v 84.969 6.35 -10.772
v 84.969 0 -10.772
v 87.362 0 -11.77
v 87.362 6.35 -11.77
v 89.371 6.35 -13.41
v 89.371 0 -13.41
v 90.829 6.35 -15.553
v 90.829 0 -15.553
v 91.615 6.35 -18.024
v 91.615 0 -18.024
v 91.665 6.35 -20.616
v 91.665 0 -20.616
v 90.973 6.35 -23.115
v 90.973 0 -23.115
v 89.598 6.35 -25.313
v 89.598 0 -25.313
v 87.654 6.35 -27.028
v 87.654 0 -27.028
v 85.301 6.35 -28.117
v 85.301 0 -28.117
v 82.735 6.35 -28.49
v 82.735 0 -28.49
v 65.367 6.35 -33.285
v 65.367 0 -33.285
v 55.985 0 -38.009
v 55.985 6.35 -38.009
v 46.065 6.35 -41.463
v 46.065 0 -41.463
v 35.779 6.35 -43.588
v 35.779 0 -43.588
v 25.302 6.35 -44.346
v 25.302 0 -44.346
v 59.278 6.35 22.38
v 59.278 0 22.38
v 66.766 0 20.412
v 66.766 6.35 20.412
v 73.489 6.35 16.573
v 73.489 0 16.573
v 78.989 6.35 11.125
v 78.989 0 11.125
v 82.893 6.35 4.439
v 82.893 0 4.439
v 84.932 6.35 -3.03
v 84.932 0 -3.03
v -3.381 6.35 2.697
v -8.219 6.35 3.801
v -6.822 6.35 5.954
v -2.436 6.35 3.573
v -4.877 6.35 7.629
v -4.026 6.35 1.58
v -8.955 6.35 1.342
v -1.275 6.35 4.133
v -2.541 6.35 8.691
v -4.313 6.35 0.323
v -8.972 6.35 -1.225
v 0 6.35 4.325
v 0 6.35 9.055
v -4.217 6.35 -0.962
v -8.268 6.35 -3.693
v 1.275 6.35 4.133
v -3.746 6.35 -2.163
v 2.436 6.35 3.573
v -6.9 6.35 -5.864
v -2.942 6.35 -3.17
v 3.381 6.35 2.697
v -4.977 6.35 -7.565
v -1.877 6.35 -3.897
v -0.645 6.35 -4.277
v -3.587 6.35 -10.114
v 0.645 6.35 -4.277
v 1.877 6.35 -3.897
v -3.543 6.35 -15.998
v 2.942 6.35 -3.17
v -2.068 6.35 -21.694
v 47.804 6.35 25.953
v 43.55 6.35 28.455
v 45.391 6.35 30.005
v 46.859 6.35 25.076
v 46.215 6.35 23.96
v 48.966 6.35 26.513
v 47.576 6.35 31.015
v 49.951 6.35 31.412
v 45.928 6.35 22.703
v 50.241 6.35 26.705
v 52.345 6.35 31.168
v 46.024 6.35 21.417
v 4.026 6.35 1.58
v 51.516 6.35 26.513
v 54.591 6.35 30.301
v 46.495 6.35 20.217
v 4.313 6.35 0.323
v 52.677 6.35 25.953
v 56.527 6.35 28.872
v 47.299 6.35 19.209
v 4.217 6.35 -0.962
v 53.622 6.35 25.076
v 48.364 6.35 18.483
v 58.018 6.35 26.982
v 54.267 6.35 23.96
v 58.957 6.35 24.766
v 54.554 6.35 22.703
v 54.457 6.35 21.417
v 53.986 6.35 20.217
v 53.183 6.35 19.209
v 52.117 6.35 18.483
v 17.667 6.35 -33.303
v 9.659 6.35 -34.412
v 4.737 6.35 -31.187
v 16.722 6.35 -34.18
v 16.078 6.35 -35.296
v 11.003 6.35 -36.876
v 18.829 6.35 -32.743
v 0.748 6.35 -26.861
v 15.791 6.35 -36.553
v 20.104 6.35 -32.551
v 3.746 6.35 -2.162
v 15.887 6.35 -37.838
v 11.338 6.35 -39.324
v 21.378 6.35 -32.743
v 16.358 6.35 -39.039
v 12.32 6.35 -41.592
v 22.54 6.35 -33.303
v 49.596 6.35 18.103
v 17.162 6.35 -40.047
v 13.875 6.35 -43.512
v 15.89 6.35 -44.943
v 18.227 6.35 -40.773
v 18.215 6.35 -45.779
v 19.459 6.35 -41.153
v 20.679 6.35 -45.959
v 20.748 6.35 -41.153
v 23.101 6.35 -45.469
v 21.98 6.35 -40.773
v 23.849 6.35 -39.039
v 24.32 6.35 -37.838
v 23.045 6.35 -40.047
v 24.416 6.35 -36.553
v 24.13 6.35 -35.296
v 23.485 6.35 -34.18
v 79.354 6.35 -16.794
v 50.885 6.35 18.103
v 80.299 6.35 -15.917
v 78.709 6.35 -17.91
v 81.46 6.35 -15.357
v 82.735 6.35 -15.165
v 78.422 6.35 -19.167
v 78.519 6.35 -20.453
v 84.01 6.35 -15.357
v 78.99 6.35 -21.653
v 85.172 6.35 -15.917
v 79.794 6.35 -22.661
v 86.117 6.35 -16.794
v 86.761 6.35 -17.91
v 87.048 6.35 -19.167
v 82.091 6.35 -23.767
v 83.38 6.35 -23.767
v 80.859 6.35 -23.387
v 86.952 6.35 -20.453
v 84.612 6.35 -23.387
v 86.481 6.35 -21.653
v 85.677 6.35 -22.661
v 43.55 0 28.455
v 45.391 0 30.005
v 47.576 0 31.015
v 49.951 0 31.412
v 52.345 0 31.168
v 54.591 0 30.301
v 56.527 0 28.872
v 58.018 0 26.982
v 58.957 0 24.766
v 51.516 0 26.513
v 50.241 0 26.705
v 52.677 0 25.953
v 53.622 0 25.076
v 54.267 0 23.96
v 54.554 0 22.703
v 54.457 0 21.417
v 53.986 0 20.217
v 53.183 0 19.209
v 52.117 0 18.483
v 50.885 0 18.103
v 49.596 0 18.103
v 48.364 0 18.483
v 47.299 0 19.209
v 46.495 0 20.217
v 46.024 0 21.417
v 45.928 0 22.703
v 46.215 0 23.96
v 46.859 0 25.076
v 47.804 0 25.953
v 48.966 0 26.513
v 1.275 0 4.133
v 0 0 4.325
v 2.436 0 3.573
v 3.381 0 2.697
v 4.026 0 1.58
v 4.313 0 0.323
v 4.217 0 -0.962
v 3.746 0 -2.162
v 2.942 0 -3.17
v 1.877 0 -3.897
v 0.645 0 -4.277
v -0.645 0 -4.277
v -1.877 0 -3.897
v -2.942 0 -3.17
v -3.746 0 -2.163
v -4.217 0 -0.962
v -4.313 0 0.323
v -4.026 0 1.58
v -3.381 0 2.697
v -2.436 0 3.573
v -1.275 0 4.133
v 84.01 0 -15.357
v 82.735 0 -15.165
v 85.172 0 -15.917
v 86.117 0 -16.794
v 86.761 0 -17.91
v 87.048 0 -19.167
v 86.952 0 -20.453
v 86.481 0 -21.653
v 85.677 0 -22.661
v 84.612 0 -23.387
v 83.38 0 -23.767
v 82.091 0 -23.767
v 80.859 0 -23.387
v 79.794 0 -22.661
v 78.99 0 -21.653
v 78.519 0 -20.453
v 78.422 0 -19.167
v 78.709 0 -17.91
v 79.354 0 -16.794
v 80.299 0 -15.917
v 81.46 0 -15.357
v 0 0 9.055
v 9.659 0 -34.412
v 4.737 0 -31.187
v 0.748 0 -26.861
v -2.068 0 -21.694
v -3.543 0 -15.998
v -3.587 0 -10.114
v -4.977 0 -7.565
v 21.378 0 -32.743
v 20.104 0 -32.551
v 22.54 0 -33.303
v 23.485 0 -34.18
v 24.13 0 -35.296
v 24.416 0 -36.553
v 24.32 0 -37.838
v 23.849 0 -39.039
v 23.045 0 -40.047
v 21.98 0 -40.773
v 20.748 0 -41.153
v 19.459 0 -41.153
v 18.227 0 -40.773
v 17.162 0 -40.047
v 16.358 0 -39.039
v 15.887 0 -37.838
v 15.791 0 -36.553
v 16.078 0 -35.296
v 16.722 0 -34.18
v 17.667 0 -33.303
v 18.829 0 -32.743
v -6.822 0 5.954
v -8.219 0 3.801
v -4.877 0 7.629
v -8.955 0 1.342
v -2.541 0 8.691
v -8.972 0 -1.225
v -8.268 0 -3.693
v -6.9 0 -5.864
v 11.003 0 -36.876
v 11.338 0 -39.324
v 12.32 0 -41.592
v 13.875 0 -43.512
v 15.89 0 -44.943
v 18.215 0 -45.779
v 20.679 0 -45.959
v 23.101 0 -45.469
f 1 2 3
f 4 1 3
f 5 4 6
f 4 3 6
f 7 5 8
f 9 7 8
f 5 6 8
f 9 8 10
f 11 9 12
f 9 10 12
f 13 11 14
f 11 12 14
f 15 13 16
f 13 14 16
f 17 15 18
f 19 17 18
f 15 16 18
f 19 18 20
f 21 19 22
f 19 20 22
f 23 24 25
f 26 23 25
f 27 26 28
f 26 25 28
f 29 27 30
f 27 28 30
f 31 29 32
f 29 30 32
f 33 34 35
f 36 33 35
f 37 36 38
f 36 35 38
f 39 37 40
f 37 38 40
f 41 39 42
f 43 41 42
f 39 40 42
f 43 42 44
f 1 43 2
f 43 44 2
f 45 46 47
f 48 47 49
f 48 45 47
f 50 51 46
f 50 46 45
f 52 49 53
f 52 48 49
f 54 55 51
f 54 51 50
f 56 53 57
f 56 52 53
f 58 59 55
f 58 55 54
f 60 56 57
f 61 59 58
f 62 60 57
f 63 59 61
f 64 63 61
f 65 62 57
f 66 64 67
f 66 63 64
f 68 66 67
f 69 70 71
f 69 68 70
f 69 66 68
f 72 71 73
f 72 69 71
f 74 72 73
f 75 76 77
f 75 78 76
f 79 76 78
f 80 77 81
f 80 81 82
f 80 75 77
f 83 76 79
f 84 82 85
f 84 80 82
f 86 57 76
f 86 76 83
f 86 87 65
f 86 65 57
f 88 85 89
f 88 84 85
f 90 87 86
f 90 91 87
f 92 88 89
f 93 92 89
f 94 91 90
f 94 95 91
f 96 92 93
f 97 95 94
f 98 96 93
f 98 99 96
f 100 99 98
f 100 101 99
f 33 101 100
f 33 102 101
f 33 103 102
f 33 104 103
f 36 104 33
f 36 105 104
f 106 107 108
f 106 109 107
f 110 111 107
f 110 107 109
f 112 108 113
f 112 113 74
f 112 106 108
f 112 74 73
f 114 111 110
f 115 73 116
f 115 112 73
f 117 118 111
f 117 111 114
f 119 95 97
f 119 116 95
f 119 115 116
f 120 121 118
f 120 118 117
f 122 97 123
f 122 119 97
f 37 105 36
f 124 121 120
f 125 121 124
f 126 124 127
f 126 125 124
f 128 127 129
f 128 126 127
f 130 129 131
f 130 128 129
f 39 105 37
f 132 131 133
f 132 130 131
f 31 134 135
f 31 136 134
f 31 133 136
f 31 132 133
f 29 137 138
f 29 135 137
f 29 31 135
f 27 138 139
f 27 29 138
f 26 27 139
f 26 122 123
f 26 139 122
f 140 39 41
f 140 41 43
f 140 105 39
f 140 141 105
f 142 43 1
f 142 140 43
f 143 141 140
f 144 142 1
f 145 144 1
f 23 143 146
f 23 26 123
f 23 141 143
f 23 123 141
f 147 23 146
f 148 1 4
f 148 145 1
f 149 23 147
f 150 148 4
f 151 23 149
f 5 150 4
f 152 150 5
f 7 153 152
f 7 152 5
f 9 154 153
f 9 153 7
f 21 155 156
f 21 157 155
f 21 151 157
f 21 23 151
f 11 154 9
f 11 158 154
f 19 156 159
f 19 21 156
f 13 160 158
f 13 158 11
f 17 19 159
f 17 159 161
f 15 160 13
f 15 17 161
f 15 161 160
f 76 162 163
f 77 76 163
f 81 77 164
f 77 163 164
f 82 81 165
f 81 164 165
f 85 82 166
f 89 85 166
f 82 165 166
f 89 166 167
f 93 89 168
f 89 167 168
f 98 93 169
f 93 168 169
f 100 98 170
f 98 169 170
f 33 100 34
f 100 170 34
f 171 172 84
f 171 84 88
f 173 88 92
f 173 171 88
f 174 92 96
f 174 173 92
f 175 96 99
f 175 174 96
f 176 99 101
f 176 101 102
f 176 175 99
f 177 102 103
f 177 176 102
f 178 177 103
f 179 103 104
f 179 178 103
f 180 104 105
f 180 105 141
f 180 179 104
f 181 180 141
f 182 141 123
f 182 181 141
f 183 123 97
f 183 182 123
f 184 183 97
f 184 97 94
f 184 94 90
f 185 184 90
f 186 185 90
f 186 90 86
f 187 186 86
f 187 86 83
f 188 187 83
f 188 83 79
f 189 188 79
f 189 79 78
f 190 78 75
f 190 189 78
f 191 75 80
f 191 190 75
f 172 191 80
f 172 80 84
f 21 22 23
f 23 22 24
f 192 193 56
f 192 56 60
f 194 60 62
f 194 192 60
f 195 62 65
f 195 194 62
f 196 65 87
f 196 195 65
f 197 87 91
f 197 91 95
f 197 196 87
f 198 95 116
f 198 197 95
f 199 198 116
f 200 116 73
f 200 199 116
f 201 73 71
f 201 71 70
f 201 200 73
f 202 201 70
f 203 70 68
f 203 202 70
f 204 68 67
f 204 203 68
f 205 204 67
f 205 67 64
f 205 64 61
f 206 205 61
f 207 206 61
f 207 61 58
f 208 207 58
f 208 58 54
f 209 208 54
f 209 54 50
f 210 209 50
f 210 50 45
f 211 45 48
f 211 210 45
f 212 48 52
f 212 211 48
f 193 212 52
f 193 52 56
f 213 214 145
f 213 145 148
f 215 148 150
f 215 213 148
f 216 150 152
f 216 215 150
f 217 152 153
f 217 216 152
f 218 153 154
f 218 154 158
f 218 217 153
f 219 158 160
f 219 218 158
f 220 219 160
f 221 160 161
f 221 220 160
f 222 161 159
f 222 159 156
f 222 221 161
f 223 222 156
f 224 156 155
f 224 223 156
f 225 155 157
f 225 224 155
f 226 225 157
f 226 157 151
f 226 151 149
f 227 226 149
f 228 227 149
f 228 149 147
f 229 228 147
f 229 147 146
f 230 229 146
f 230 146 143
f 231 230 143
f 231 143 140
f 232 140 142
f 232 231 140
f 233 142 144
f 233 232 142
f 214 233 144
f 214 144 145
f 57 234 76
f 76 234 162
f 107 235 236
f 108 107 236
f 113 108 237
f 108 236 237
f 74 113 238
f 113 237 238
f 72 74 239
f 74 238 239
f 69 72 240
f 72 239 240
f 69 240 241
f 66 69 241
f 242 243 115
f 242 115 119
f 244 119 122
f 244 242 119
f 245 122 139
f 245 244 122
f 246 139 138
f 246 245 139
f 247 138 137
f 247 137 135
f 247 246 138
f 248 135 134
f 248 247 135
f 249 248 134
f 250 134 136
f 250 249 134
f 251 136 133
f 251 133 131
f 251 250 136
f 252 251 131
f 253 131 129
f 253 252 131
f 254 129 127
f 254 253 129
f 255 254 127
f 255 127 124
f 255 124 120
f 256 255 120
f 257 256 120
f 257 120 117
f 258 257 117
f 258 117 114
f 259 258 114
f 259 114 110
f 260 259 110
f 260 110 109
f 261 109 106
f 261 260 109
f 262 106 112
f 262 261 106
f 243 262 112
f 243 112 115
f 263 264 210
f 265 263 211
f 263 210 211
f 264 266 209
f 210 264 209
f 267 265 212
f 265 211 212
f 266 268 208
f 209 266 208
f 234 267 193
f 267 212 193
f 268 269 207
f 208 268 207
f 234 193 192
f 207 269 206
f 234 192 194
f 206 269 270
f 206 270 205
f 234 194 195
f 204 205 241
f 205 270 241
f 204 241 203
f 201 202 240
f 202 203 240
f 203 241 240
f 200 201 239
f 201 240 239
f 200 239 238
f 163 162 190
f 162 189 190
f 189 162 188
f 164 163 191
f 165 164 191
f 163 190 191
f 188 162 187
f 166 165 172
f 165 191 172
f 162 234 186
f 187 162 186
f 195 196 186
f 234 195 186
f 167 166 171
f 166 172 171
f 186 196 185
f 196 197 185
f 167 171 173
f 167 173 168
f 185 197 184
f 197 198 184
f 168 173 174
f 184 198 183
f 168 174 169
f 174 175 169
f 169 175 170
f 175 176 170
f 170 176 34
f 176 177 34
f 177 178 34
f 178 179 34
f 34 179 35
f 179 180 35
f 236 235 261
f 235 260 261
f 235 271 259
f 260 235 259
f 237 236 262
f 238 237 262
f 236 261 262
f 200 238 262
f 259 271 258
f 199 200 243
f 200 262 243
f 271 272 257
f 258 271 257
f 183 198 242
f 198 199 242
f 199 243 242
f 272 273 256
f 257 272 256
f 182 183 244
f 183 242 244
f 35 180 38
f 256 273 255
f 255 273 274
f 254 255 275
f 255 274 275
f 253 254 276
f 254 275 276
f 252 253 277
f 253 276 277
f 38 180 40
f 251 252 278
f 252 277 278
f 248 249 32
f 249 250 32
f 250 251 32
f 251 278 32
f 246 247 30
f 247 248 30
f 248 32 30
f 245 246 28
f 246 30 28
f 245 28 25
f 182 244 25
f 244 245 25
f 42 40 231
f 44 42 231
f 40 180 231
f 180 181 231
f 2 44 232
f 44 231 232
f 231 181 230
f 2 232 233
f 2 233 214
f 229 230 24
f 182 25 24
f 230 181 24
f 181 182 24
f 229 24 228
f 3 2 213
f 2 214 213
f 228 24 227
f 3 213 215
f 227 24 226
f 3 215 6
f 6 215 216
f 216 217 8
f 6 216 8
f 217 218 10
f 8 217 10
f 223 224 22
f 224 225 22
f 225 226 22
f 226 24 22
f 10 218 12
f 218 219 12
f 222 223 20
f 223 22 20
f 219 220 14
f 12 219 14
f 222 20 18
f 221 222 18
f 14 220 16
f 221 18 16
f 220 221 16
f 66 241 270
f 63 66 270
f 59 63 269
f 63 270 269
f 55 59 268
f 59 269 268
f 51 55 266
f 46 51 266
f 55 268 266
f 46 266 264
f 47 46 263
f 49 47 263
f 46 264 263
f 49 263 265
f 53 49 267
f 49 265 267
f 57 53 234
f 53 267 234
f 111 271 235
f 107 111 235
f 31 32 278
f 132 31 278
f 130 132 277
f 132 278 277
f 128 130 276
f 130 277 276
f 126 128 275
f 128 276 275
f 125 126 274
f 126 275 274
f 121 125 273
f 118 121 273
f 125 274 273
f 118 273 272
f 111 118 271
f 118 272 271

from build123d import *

# Parameters (mm, degrees)
SKETCH1_R      = 4.325
EXTRUDE1_DEPTH = 6.35


with BuildPart() as part:
    # Sketch1 → Extrude1 (new body)
    with BuildSketch(Plane(origin=(0, 0, 0), x_dir=(1, 0, 0), z_dir=(0, 1, 0))):
        with BuildLine():
            Line((0, -9.055124804), (43.550282623, -28.454685784))
            ThreePointArc((43.550282623, -28.454685784), (53.496937792, -30.809853354), (59.277793564, -22.379878865))
            ThreePointArc((59.277793564, -22.379878865), (78.989447237, -11.124841627), (84.969178064, 10.771915509))
            ThreePointArc((84.969178064, 10.771915509), (91.664608112, 20.616056931), (82.735296136, 28.490273813))
            Line((82.735296136, 28.490273813), (65.366646785, 33.285339694))
            ThreePointArc((65.366646785, 33.285339694), (46.065339232, 41.463051172), (25.302313168, 44.34613753))
            ThreePointArc((25.302313168, 44.34613753), (15.889627698, 44.942765056), (11.002555987, 36.876096458))
            Line((11.002555987, 36.876096458), (9.659067514, 34.411727615))
            ThreePointArc((9.659067514, 34.411727615), (-0.818805509, 24.364317263), (-3.587222868, 10.113978909))
            Line((-3.587222868, 10.113978909), (-4.976998188, 7.564705828))
            ThreePointArc((-4.976998188, 7.564705828), (-8.67452133, -2.597684531), (0, -9.055124804))
        make_face()
        with Locations(Location((20.103569583, 36.876096458, 0), (0, 0, 270))):  # turned: the seam where the file's is
            Circle(SKETCH1_R, mode=Mode.SUBTRACT)
        with Locations(Location((0, 0, 0), (0, 0, 270))):  # turned: the seam where the file's is
            Circle(SKETCH1_R, mode=Mode.SUBTRACT)
        with Locations(Location((50.240830228, -22.379878865, 0), (0, 0, 270))):  # turned: the seam where the file's is
            Circle(SKETCH1_R, mode=Mode.SUBTRACT)
        with Locations(Location((82.735296136, 19.490273813, 0), (0, 0, 270))):  # turned: the seam where the file's is
            Circle(SKETCH1_R, mode=Mode.SUBTRACT)
    extrude(amount=EXTRUDE1_DEPTH)


solid = part.part
